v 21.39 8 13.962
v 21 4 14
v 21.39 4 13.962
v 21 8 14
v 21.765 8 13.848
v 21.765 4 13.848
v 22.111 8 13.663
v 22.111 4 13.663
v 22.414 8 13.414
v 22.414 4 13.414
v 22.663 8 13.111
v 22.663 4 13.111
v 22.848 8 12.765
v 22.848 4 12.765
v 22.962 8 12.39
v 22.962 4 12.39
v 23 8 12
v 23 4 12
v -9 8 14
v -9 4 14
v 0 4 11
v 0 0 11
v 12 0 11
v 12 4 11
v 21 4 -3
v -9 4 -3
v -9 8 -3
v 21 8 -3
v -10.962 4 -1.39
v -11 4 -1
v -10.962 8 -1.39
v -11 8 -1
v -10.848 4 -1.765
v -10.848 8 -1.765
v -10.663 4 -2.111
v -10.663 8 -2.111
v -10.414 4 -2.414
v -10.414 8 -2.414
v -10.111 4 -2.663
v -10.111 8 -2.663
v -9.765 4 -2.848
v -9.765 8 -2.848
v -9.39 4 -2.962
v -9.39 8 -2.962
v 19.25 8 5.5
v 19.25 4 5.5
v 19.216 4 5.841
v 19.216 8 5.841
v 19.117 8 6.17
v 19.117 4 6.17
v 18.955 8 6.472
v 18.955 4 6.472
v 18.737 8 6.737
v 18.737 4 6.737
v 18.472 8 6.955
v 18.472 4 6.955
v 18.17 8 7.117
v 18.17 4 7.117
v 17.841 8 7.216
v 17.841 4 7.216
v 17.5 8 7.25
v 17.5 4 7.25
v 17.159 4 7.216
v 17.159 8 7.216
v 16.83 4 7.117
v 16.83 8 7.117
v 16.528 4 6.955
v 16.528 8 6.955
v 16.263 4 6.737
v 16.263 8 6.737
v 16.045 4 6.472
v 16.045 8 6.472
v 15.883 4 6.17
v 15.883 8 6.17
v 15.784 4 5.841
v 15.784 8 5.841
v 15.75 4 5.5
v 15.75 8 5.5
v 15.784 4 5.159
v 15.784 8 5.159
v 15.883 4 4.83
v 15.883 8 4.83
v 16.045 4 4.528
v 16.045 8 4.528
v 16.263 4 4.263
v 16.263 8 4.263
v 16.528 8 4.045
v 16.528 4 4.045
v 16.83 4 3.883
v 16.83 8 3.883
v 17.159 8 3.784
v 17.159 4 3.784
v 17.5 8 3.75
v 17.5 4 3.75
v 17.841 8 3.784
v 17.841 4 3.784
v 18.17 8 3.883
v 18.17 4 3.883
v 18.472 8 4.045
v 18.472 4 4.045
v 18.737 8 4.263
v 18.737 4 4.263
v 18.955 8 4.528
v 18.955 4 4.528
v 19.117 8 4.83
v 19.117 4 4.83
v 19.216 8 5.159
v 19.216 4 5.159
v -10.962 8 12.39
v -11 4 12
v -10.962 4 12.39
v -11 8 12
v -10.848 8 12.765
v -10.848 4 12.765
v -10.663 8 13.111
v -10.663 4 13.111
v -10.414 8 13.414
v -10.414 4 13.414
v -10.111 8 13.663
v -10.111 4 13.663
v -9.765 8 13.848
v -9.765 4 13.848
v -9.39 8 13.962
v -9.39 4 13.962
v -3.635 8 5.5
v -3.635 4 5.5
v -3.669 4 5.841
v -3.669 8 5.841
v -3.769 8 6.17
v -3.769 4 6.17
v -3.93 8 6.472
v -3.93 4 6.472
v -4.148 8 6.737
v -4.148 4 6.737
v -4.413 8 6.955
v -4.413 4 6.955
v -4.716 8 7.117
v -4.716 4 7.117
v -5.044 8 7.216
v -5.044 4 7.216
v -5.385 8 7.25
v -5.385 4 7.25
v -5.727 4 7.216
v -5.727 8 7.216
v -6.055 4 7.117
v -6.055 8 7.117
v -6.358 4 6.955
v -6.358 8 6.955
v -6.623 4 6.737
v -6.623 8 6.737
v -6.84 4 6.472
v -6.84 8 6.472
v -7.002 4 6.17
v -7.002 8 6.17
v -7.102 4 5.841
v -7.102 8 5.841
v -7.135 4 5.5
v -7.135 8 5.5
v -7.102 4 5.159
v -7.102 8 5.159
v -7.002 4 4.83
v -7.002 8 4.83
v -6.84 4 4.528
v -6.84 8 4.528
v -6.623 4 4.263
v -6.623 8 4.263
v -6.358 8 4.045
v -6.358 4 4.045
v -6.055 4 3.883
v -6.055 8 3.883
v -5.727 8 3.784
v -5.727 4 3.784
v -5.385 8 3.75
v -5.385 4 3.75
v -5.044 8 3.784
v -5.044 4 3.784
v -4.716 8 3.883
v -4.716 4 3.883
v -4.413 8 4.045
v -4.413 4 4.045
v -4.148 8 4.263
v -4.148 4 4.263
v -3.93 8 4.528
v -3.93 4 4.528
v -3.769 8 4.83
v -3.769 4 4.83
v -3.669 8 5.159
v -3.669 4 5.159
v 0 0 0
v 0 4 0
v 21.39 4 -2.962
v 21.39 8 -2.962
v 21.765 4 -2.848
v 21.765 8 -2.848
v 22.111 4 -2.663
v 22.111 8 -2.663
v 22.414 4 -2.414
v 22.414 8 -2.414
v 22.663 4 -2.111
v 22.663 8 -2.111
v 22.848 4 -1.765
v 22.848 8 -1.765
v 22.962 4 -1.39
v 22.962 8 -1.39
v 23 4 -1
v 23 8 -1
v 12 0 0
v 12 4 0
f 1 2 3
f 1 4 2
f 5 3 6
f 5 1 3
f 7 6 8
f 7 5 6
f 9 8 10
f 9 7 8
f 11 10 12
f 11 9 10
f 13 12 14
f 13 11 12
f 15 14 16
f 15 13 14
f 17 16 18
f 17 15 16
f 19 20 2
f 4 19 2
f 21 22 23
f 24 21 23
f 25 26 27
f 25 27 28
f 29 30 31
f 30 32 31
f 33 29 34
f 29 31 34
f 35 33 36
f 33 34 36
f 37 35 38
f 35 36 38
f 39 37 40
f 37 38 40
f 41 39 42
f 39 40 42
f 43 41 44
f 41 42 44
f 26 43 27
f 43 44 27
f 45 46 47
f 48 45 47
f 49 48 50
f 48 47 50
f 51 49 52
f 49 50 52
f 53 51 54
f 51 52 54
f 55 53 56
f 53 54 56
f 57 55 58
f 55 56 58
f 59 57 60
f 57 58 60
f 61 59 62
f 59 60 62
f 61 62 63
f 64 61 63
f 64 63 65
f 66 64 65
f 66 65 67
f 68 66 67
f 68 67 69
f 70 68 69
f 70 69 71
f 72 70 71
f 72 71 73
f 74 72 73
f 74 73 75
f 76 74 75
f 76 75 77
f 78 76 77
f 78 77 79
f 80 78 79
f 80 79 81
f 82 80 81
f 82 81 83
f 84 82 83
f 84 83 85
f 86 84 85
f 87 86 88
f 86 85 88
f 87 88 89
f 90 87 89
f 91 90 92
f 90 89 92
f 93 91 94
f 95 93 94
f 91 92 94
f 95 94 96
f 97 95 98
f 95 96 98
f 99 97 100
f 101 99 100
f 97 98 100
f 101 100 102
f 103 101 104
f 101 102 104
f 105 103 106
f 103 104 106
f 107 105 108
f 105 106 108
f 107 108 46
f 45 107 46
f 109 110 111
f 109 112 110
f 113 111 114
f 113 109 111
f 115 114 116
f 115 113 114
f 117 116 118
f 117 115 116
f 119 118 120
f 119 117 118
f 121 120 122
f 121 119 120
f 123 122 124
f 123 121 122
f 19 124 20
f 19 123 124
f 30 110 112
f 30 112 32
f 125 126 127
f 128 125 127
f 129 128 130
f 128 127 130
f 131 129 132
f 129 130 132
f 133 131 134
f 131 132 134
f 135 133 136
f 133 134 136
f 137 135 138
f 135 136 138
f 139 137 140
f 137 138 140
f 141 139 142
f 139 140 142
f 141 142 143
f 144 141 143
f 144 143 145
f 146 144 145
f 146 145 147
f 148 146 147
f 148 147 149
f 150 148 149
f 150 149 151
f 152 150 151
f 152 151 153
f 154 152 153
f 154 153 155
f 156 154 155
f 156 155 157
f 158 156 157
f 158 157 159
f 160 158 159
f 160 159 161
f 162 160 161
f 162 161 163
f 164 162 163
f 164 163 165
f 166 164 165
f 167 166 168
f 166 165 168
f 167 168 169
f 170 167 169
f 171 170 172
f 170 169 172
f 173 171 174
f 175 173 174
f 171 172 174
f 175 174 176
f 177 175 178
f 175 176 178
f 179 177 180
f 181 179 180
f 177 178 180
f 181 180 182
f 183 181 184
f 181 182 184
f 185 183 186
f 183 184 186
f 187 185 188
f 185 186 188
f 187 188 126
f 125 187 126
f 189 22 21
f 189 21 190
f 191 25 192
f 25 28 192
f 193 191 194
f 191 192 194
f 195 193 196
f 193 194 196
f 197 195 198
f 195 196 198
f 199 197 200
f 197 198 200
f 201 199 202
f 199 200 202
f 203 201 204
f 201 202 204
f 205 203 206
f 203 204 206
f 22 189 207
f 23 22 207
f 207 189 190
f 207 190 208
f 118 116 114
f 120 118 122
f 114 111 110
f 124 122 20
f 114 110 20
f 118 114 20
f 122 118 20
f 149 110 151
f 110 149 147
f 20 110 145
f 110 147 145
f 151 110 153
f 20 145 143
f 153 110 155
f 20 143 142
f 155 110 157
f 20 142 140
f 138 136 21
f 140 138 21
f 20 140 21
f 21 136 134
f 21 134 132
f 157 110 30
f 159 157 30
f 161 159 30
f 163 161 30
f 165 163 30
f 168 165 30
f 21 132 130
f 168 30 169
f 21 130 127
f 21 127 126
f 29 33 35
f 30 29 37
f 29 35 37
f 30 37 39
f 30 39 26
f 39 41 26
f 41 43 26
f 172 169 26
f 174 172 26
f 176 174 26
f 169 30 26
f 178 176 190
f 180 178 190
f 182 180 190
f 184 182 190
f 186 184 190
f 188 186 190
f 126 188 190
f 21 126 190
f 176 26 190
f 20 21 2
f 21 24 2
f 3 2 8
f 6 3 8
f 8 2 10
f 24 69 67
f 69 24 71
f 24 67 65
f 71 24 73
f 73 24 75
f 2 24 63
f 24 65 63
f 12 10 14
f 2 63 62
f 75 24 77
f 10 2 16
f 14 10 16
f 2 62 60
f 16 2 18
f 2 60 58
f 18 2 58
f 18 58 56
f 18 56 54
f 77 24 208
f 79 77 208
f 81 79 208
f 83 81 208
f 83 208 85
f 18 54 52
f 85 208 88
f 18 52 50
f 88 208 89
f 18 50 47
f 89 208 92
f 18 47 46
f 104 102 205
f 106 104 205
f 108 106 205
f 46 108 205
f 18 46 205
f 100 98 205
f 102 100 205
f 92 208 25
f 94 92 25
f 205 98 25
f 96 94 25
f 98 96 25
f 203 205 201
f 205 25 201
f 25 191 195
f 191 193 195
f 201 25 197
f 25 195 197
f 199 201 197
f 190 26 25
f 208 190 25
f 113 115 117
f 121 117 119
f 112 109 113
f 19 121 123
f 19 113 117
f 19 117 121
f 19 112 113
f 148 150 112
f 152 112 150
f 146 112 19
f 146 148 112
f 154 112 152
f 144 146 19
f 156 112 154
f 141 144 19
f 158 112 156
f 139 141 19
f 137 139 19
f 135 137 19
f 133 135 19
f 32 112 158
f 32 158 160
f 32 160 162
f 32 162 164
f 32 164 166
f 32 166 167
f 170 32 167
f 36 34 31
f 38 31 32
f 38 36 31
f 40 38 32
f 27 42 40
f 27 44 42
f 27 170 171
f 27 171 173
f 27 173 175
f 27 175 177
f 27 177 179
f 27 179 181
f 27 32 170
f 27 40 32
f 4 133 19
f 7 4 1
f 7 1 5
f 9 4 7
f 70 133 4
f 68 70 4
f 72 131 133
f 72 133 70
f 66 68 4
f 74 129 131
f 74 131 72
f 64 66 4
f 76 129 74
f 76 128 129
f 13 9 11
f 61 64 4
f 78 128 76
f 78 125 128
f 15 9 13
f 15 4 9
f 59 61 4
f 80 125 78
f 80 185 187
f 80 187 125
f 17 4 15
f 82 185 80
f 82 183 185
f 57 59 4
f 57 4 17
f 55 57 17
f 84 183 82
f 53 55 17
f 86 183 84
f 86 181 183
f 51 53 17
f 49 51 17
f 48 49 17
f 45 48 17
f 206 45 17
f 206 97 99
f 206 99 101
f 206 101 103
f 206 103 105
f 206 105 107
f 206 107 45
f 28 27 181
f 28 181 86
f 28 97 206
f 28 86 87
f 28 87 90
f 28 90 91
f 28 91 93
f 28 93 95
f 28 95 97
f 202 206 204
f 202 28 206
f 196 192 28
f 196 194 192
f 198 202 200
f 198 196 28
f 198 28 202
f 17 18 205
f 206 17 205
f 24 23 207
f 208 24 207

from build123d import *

# Parameters (mm, degrees)
SKETCH1_W           = 12
SKETCH1_H           = 11
BOSS_EXTRUDE1_DEPTH = 4
SKETCH2_W           = 34
SKETCH2_H           = 17
BOSS_EXTRUDE2_DEPTH = 4
SKETCH3_R           = 1.75
CUT_EXTRUDE1_DEPTH  = 5
FILLET1_R           = 2


with BuildPart() as part:
    # Sketch1 → Boss-Extrude1 (new body)
    with BuildSketch(Plane(origin=(0, 0, 0), x_dir=(1, 0, 0), z_dir=(0, 1, 0))):
        with Locations((6, -5.5)):
            Rectangle(SKETCH1_W, SKETCH1_H)
    extrude(amount=BOSS_EXTRUDE1_DEPTH)

    # Sketch2 → Boss-Extrude2 (add)
    with BuildSketch(Plane(origin=(0, 4, 0), x_dir=(1, 0, 0), z_dir=(0, 1, 0))):
        with Locations((6, -5.5)):
            Rectangle(SKETCH2_W, SKETCH2_H)
    extrude(amount=BOSS_EXTRUDE2_DEPTH)

    # Sketch3 → Cut-Extrude1 (cut, through all)
    with BuildSketch(Plane.XZ.offset(-4)):
        with Locations((-5.385399537, 5.5)):
            Circle(SKETCH3_R)
        with Locations((17.5, 5.5)):
            Circle(SKETCH3_R)
    extrude(amount=-CUT_EXTRUDE1_DEPTH, mode=Mode.SUBTRACT)

    # Fillet1
    fillet1_edges = [part.edges().sort_by_distance(p)[0] for p in [
        (23, 6, 14),
        (23, 6, -3),
        (-11, 6, -3),
        (-11, 6, 14),
    ]]
    fillet(fillet1_edges, radius=FILLET1_R)


solid = part.part
